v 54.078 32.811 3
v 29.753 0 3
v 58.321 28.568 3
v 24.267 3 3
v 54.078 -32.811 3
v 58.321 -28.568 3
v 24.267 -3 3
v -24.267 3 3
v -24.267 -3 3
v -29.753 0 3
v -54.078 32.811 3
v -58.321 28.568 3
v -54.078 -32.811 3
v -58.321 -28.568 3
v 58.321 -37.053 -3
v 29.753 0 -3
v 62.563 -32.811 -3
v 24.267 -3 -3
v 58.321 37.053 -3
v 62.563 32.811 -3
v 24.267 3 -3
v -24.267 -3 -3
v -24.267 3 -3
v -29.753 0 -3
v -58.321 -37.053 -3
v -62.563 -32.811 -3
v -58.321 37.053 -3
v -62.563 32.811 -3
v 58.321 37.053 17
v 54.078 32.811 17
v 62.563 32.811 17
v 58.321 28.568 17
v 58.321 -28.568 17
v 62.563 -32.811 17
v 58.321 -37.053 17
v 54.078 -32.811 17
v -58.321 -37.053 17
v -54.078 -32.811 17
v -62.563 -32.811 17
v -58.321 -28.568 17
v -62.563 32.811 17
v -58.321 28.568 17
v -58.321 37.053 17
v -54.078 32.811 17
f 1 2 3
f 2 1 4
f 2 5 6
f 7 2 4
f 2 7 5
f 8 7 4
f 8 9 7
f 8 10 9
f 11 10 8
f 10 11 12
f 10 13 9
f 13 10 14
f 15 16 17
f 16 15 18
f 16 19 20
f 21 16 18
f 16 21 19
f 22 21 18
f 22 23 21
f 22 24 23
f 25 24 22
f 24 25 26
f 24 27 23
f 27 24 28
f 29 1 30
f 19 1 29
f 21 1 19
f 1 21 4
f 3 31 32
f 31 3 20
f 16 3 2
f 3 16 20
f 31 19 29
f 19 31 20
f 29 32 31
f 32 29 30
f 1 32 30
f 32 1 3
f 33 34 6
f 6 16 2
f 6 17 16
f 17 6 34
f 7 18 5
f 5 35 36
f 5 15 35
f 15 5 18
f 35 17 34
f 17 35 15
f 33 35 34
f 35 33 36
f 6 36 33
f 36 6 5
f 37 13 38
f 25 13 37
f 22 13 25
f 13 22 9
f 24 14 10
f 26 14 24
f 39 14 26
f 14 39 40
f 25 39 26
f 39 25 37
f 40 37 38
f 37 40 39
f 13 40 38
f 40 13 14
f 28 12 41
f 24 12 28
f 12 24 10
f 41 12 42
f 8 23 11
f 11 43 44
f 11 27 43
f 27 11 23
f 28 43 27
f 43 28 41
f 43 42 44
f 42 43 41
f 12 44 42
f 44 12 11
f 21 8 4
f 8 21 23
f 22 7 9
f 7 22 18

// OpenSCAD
jarDiameter = 86;

lipOverhang = 20;

mountGap = 33;
mountHoleSize = 2;

thickness = 6;
bulkhead = [50, thickness, thickness];

// cylinder(jarDiameter);

cube(bulkhead, true);

support = [jarDiameter - bulkhead[0] + thickness * 2, thickness, thickness];

translate([bulkhead[0] * 0.707 + thickness, support[0] * 0.33, 0]) {
    rotate([0,0,45]){
        cube(support, true);
        translate([support[0] / 2, 0, lipOverhang / 2 - thickness / 2]){
            cube([thickness, thickness, lipOverhang], true);
        }
    }
}

translate([bulkhead[0] * 0.707 + thickness, -support[0] * 0.33, 0]) {
    rotate([0,0,-45]){
        cube(support, true);
        translate([support[0] / 2, 0, lipOverhang / 2 - thickness / 2]){
            cube([thickness, thickness, lipOverhang], true);
        }
    }
}

translate([-bulkhead[0] * 0.707 - thickness, -support[0] * 0.33, 0]) {
    rotate([0,0,-135]){
        cube(support, true);
        translate([support[0] / 2, 0, lipOverhang / 2 - thickness / 2]){
            cube([thickness, thickness, lipOverhang], true);
        }
    }
}

translate([-bulkhead[0] * 0.707 - thickness, support[0] * 0.33, 0]) {
    rotate([0,0,135]){
        cube(support, true);
        translate([support[0] / 2, 0, lipOverhang / 2 - thickness / 2]){
            cube([thickness, thickness, lipOverhang], true);
        }
    }
}
